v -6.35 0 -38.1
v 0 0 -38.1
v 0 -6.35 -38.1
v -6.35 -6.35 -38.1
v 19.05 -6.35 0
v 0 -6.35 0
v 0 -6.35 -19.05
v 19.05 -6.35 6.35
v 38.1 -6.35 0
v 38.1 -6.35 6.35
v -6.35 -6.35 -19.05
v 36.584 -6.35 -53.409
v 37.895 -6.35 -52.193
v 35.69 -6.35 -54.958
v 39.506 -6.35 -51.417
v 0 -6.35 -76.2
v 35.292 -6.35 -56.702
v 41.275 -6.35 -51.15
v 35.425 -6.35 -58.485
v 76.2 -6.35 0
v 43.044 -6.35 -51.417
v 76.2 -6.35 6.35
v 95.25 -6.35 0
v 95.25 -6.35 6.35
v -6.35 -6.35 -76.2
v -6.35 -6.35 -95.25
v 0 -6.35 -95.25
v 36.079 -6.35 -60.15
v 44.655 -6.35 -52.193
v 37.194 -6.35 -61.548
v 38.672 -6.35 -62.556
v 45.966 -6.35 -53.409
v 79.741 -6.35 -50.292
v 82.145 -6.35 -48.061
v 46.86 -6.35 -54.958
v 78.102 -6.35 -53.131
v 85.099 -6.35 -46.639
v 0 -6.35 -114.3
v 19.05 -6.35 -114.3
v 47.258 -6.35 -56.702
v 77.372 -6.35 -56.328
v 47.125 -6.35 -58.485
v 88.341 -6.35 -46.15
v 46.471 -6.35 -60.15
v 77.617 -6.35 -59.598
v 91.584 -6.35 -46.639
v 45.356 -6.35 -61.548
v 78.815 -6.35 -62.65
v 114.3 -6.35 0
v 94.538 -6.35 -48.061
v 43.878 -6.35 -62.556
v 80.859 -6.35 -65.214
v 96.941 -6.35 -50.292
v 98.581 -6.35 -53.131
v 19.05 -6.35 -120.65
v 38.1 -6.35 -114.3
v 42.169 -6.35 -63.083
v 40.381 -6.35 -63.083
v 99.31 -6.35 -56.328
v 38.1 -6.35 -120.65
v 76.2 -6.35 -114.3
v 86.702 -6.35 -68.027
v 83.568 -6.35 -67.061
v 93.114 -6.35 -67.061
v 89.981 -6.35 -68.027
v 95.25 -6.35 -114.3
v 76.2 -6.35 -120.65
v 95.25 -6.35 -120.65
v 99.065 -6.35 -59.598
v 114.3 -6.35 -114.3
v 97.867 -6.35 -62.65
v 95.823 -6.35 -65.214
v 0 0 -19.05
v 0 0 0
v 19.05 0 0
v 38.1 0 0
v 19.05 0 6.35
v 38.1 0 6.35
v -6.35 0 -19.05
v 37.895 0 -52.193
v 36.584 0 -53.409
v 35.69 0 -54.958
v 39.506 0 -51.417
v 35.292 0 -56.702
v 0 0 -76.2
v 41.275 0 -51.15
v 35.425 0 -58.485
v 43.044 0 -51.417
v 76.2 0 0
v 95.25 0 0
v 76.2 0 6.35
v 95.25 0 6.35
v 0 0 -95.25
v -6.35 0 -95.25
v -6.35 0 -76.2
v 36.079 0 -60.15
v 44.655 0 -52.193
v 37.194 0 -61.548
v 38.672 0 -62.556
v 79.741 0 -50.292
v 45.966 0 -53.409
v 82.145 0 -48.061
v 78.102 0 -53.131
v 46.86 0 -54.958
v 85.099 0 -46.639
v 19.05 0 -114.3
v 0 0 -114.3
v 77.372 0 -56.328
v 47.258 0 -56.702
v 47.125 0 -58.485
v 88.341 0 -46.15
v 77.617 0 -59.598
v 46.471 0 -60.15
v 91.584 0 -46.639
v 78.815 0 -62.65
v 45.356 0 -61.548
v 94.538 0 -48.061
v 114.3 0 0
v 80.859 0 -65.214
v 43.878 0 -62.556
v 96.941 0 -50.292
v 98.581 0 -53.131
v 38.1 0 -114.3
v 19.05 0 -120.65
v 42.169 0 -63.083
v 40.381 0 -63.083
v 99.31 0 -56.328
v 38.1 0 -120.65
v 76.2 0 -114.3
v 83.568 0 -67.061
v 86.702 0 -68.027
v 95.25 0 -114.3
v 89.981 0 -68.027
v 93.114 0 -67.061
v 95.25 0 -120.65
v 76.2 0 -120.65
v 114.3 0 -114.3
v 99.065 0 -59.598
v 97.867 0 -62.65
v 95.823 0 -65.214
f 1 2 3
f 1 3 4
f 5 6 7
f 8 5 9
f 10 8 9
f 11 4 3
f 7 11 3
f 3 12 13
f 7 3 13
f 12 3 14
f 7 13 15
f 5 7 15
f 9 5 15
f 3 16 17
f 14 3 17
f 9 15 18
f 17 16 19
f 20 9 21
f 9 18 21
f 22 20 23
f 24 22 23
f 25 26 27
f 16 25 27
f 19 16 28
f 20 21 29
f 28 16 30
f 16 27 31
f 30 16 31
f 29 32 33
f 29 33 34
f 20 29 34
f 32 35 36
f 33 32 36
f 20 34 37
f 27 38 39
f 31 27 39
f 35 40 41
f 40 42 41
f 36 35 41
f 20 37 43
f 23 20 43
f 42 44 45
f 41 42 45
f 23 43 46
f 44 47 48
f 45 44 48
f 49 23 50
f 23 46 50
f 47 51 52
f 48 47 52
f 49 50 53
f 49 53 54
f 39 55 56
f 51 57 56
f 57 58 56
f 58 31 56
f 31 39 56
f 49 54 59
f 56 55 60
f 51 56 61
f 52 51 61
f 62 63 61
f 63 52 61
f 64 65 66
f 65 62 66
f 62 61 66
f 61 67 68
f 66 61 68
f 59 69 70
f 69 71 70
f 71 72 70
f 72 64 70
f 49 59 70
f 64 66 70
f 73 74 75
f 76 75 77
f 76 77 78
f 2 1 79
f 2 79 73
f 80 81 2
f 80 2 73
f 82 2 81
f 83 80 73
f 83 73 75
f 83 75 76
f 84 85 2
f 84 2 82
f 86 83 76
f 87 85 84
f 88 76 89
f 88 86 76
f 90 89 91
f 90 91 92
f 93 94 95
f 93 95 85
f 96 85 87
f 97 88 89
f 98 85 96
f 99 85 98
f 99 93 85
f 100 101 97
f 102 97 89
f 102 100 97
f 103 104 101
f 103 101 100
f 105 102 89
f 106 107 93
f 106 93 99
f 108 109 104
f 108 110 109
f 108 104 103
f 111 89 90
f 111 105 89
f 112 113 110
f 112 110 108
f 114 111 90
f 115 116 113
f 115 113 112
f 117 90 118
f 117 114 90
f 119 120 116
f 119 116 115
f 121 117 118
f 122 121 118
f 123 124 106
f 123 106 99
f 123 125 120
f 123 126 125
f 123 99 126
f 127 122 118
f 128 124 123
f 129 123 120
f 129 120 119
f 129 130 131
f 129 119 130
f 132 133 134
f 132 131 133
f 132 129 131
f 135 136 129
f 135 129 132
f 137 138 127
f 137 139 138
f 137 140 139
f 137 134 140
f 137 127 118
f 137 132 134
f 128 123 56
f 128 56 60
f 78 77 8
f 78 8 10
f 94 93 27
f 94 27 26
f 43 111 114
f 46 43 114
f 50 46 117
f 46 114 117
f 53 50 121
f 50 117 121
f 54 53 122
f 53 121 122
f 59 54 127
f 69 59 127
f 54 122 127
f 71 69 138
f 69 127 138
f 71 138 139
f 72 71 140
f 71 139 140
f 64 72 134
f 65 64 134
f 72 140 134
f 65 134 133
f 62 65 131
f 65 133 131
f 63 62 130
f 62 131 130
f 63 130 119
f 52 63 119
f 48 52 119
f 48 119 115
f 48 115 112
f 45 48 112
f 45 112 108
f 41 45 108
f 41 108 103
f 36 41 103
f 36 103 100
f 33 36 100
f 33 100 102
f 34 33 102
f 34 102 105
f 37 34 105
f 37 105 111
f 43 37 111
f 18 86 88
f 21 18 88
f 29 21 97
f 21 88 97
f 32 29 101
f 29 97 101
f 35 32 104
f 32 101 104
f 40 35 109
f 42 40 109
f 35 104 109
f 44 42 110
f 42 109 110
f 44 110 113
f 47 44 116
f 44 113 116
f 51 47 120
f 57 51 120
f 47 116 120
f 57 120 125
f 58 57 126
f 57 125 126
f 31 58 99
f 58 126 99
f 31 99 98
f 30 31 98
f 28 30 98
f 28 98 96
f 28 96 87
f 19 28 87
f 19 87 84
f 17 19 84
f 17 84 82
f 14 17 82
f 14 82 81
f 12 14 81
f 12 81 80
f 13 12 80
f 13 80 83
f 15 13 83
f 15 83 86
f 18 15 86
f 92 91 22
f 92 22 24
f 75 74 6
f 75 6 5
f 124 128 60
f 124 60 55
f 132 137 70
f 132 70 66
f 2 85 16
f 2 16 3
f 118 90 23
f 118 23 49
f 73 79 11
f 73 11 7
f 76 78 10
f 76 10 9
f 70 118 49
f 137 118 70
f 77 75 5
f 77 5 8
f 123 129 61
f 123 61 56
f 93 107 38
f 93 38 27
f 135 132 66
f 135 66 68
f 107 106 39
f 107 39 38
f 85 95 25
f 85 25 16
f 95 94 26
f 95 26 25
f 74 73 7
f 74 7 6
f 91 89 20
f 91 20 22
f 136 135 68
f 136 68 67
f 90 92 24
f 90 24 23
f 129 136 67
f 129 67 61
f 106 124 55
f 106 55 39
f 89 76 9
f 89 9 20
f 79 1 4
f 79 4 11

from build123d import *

# Parameters (mm, degrees)
BOSS_EXTRUDE1_DEPTH = 6.35
SKETCH2_R           = 11
SKETCH2_R_2         = 5.999988
CUT_EXTRUDE1_DEPTH  = 167.316670842


with BuildPart() as part:
    # Sketch1 → Boss-Extrude1 (new body)
    with BuildSketch(Plane(origin=(0, 0, 0), x_dir=(1, 0, 0), z_dir=(0, 1, 0))):
        Polygon((0, 0), (19.05, 0), (19.05, -6.35), (38.1, -6.35), (38.1, 0), (76.2, 0), (76.2, -6.35), (95.25, -6.35), (95.25, 0), (114.3, 0), (114.3, 114.3), (95.25, 114.3), (95.25, 120.65), (76.2, 120.65), (76.2, 114.3), (38.1, 114.3), (38.1, 120.65), (19.05, 120.65), (19.05, 114.3), (0, 114.3), (0, 95.25), (-6.35, 95.25), (-6.35, 76.2), (0, 76.2), (0, 38.1), (-6.35, 38.1), (-6.35, 19.05), (0, 19.05), align=None)
    extrude(amount=-BOSS_EXTRUDE1_DEPTH)

    # Sketch2 → Cut-Extrude1 (cut, through all)
    with BuildSketch(Plane(origin=(0, 0, 0), x_dir=(1, 0, 0), z_dir=(0, 1, 0))):
        with Locations(Location((88.3412, 57.15, 0), (0, 0, 270))):
            Circle(SKETCH2_R)
        with Locations(Location((41.275, 57.15, 0), (0, 0, 270))):
            Circle(SKETCH2_R_2)
    extrude(amount=-CUT_EXTRUDE1_DEPTH, mode=Mode.SUBTRACT)


solid = part.part
